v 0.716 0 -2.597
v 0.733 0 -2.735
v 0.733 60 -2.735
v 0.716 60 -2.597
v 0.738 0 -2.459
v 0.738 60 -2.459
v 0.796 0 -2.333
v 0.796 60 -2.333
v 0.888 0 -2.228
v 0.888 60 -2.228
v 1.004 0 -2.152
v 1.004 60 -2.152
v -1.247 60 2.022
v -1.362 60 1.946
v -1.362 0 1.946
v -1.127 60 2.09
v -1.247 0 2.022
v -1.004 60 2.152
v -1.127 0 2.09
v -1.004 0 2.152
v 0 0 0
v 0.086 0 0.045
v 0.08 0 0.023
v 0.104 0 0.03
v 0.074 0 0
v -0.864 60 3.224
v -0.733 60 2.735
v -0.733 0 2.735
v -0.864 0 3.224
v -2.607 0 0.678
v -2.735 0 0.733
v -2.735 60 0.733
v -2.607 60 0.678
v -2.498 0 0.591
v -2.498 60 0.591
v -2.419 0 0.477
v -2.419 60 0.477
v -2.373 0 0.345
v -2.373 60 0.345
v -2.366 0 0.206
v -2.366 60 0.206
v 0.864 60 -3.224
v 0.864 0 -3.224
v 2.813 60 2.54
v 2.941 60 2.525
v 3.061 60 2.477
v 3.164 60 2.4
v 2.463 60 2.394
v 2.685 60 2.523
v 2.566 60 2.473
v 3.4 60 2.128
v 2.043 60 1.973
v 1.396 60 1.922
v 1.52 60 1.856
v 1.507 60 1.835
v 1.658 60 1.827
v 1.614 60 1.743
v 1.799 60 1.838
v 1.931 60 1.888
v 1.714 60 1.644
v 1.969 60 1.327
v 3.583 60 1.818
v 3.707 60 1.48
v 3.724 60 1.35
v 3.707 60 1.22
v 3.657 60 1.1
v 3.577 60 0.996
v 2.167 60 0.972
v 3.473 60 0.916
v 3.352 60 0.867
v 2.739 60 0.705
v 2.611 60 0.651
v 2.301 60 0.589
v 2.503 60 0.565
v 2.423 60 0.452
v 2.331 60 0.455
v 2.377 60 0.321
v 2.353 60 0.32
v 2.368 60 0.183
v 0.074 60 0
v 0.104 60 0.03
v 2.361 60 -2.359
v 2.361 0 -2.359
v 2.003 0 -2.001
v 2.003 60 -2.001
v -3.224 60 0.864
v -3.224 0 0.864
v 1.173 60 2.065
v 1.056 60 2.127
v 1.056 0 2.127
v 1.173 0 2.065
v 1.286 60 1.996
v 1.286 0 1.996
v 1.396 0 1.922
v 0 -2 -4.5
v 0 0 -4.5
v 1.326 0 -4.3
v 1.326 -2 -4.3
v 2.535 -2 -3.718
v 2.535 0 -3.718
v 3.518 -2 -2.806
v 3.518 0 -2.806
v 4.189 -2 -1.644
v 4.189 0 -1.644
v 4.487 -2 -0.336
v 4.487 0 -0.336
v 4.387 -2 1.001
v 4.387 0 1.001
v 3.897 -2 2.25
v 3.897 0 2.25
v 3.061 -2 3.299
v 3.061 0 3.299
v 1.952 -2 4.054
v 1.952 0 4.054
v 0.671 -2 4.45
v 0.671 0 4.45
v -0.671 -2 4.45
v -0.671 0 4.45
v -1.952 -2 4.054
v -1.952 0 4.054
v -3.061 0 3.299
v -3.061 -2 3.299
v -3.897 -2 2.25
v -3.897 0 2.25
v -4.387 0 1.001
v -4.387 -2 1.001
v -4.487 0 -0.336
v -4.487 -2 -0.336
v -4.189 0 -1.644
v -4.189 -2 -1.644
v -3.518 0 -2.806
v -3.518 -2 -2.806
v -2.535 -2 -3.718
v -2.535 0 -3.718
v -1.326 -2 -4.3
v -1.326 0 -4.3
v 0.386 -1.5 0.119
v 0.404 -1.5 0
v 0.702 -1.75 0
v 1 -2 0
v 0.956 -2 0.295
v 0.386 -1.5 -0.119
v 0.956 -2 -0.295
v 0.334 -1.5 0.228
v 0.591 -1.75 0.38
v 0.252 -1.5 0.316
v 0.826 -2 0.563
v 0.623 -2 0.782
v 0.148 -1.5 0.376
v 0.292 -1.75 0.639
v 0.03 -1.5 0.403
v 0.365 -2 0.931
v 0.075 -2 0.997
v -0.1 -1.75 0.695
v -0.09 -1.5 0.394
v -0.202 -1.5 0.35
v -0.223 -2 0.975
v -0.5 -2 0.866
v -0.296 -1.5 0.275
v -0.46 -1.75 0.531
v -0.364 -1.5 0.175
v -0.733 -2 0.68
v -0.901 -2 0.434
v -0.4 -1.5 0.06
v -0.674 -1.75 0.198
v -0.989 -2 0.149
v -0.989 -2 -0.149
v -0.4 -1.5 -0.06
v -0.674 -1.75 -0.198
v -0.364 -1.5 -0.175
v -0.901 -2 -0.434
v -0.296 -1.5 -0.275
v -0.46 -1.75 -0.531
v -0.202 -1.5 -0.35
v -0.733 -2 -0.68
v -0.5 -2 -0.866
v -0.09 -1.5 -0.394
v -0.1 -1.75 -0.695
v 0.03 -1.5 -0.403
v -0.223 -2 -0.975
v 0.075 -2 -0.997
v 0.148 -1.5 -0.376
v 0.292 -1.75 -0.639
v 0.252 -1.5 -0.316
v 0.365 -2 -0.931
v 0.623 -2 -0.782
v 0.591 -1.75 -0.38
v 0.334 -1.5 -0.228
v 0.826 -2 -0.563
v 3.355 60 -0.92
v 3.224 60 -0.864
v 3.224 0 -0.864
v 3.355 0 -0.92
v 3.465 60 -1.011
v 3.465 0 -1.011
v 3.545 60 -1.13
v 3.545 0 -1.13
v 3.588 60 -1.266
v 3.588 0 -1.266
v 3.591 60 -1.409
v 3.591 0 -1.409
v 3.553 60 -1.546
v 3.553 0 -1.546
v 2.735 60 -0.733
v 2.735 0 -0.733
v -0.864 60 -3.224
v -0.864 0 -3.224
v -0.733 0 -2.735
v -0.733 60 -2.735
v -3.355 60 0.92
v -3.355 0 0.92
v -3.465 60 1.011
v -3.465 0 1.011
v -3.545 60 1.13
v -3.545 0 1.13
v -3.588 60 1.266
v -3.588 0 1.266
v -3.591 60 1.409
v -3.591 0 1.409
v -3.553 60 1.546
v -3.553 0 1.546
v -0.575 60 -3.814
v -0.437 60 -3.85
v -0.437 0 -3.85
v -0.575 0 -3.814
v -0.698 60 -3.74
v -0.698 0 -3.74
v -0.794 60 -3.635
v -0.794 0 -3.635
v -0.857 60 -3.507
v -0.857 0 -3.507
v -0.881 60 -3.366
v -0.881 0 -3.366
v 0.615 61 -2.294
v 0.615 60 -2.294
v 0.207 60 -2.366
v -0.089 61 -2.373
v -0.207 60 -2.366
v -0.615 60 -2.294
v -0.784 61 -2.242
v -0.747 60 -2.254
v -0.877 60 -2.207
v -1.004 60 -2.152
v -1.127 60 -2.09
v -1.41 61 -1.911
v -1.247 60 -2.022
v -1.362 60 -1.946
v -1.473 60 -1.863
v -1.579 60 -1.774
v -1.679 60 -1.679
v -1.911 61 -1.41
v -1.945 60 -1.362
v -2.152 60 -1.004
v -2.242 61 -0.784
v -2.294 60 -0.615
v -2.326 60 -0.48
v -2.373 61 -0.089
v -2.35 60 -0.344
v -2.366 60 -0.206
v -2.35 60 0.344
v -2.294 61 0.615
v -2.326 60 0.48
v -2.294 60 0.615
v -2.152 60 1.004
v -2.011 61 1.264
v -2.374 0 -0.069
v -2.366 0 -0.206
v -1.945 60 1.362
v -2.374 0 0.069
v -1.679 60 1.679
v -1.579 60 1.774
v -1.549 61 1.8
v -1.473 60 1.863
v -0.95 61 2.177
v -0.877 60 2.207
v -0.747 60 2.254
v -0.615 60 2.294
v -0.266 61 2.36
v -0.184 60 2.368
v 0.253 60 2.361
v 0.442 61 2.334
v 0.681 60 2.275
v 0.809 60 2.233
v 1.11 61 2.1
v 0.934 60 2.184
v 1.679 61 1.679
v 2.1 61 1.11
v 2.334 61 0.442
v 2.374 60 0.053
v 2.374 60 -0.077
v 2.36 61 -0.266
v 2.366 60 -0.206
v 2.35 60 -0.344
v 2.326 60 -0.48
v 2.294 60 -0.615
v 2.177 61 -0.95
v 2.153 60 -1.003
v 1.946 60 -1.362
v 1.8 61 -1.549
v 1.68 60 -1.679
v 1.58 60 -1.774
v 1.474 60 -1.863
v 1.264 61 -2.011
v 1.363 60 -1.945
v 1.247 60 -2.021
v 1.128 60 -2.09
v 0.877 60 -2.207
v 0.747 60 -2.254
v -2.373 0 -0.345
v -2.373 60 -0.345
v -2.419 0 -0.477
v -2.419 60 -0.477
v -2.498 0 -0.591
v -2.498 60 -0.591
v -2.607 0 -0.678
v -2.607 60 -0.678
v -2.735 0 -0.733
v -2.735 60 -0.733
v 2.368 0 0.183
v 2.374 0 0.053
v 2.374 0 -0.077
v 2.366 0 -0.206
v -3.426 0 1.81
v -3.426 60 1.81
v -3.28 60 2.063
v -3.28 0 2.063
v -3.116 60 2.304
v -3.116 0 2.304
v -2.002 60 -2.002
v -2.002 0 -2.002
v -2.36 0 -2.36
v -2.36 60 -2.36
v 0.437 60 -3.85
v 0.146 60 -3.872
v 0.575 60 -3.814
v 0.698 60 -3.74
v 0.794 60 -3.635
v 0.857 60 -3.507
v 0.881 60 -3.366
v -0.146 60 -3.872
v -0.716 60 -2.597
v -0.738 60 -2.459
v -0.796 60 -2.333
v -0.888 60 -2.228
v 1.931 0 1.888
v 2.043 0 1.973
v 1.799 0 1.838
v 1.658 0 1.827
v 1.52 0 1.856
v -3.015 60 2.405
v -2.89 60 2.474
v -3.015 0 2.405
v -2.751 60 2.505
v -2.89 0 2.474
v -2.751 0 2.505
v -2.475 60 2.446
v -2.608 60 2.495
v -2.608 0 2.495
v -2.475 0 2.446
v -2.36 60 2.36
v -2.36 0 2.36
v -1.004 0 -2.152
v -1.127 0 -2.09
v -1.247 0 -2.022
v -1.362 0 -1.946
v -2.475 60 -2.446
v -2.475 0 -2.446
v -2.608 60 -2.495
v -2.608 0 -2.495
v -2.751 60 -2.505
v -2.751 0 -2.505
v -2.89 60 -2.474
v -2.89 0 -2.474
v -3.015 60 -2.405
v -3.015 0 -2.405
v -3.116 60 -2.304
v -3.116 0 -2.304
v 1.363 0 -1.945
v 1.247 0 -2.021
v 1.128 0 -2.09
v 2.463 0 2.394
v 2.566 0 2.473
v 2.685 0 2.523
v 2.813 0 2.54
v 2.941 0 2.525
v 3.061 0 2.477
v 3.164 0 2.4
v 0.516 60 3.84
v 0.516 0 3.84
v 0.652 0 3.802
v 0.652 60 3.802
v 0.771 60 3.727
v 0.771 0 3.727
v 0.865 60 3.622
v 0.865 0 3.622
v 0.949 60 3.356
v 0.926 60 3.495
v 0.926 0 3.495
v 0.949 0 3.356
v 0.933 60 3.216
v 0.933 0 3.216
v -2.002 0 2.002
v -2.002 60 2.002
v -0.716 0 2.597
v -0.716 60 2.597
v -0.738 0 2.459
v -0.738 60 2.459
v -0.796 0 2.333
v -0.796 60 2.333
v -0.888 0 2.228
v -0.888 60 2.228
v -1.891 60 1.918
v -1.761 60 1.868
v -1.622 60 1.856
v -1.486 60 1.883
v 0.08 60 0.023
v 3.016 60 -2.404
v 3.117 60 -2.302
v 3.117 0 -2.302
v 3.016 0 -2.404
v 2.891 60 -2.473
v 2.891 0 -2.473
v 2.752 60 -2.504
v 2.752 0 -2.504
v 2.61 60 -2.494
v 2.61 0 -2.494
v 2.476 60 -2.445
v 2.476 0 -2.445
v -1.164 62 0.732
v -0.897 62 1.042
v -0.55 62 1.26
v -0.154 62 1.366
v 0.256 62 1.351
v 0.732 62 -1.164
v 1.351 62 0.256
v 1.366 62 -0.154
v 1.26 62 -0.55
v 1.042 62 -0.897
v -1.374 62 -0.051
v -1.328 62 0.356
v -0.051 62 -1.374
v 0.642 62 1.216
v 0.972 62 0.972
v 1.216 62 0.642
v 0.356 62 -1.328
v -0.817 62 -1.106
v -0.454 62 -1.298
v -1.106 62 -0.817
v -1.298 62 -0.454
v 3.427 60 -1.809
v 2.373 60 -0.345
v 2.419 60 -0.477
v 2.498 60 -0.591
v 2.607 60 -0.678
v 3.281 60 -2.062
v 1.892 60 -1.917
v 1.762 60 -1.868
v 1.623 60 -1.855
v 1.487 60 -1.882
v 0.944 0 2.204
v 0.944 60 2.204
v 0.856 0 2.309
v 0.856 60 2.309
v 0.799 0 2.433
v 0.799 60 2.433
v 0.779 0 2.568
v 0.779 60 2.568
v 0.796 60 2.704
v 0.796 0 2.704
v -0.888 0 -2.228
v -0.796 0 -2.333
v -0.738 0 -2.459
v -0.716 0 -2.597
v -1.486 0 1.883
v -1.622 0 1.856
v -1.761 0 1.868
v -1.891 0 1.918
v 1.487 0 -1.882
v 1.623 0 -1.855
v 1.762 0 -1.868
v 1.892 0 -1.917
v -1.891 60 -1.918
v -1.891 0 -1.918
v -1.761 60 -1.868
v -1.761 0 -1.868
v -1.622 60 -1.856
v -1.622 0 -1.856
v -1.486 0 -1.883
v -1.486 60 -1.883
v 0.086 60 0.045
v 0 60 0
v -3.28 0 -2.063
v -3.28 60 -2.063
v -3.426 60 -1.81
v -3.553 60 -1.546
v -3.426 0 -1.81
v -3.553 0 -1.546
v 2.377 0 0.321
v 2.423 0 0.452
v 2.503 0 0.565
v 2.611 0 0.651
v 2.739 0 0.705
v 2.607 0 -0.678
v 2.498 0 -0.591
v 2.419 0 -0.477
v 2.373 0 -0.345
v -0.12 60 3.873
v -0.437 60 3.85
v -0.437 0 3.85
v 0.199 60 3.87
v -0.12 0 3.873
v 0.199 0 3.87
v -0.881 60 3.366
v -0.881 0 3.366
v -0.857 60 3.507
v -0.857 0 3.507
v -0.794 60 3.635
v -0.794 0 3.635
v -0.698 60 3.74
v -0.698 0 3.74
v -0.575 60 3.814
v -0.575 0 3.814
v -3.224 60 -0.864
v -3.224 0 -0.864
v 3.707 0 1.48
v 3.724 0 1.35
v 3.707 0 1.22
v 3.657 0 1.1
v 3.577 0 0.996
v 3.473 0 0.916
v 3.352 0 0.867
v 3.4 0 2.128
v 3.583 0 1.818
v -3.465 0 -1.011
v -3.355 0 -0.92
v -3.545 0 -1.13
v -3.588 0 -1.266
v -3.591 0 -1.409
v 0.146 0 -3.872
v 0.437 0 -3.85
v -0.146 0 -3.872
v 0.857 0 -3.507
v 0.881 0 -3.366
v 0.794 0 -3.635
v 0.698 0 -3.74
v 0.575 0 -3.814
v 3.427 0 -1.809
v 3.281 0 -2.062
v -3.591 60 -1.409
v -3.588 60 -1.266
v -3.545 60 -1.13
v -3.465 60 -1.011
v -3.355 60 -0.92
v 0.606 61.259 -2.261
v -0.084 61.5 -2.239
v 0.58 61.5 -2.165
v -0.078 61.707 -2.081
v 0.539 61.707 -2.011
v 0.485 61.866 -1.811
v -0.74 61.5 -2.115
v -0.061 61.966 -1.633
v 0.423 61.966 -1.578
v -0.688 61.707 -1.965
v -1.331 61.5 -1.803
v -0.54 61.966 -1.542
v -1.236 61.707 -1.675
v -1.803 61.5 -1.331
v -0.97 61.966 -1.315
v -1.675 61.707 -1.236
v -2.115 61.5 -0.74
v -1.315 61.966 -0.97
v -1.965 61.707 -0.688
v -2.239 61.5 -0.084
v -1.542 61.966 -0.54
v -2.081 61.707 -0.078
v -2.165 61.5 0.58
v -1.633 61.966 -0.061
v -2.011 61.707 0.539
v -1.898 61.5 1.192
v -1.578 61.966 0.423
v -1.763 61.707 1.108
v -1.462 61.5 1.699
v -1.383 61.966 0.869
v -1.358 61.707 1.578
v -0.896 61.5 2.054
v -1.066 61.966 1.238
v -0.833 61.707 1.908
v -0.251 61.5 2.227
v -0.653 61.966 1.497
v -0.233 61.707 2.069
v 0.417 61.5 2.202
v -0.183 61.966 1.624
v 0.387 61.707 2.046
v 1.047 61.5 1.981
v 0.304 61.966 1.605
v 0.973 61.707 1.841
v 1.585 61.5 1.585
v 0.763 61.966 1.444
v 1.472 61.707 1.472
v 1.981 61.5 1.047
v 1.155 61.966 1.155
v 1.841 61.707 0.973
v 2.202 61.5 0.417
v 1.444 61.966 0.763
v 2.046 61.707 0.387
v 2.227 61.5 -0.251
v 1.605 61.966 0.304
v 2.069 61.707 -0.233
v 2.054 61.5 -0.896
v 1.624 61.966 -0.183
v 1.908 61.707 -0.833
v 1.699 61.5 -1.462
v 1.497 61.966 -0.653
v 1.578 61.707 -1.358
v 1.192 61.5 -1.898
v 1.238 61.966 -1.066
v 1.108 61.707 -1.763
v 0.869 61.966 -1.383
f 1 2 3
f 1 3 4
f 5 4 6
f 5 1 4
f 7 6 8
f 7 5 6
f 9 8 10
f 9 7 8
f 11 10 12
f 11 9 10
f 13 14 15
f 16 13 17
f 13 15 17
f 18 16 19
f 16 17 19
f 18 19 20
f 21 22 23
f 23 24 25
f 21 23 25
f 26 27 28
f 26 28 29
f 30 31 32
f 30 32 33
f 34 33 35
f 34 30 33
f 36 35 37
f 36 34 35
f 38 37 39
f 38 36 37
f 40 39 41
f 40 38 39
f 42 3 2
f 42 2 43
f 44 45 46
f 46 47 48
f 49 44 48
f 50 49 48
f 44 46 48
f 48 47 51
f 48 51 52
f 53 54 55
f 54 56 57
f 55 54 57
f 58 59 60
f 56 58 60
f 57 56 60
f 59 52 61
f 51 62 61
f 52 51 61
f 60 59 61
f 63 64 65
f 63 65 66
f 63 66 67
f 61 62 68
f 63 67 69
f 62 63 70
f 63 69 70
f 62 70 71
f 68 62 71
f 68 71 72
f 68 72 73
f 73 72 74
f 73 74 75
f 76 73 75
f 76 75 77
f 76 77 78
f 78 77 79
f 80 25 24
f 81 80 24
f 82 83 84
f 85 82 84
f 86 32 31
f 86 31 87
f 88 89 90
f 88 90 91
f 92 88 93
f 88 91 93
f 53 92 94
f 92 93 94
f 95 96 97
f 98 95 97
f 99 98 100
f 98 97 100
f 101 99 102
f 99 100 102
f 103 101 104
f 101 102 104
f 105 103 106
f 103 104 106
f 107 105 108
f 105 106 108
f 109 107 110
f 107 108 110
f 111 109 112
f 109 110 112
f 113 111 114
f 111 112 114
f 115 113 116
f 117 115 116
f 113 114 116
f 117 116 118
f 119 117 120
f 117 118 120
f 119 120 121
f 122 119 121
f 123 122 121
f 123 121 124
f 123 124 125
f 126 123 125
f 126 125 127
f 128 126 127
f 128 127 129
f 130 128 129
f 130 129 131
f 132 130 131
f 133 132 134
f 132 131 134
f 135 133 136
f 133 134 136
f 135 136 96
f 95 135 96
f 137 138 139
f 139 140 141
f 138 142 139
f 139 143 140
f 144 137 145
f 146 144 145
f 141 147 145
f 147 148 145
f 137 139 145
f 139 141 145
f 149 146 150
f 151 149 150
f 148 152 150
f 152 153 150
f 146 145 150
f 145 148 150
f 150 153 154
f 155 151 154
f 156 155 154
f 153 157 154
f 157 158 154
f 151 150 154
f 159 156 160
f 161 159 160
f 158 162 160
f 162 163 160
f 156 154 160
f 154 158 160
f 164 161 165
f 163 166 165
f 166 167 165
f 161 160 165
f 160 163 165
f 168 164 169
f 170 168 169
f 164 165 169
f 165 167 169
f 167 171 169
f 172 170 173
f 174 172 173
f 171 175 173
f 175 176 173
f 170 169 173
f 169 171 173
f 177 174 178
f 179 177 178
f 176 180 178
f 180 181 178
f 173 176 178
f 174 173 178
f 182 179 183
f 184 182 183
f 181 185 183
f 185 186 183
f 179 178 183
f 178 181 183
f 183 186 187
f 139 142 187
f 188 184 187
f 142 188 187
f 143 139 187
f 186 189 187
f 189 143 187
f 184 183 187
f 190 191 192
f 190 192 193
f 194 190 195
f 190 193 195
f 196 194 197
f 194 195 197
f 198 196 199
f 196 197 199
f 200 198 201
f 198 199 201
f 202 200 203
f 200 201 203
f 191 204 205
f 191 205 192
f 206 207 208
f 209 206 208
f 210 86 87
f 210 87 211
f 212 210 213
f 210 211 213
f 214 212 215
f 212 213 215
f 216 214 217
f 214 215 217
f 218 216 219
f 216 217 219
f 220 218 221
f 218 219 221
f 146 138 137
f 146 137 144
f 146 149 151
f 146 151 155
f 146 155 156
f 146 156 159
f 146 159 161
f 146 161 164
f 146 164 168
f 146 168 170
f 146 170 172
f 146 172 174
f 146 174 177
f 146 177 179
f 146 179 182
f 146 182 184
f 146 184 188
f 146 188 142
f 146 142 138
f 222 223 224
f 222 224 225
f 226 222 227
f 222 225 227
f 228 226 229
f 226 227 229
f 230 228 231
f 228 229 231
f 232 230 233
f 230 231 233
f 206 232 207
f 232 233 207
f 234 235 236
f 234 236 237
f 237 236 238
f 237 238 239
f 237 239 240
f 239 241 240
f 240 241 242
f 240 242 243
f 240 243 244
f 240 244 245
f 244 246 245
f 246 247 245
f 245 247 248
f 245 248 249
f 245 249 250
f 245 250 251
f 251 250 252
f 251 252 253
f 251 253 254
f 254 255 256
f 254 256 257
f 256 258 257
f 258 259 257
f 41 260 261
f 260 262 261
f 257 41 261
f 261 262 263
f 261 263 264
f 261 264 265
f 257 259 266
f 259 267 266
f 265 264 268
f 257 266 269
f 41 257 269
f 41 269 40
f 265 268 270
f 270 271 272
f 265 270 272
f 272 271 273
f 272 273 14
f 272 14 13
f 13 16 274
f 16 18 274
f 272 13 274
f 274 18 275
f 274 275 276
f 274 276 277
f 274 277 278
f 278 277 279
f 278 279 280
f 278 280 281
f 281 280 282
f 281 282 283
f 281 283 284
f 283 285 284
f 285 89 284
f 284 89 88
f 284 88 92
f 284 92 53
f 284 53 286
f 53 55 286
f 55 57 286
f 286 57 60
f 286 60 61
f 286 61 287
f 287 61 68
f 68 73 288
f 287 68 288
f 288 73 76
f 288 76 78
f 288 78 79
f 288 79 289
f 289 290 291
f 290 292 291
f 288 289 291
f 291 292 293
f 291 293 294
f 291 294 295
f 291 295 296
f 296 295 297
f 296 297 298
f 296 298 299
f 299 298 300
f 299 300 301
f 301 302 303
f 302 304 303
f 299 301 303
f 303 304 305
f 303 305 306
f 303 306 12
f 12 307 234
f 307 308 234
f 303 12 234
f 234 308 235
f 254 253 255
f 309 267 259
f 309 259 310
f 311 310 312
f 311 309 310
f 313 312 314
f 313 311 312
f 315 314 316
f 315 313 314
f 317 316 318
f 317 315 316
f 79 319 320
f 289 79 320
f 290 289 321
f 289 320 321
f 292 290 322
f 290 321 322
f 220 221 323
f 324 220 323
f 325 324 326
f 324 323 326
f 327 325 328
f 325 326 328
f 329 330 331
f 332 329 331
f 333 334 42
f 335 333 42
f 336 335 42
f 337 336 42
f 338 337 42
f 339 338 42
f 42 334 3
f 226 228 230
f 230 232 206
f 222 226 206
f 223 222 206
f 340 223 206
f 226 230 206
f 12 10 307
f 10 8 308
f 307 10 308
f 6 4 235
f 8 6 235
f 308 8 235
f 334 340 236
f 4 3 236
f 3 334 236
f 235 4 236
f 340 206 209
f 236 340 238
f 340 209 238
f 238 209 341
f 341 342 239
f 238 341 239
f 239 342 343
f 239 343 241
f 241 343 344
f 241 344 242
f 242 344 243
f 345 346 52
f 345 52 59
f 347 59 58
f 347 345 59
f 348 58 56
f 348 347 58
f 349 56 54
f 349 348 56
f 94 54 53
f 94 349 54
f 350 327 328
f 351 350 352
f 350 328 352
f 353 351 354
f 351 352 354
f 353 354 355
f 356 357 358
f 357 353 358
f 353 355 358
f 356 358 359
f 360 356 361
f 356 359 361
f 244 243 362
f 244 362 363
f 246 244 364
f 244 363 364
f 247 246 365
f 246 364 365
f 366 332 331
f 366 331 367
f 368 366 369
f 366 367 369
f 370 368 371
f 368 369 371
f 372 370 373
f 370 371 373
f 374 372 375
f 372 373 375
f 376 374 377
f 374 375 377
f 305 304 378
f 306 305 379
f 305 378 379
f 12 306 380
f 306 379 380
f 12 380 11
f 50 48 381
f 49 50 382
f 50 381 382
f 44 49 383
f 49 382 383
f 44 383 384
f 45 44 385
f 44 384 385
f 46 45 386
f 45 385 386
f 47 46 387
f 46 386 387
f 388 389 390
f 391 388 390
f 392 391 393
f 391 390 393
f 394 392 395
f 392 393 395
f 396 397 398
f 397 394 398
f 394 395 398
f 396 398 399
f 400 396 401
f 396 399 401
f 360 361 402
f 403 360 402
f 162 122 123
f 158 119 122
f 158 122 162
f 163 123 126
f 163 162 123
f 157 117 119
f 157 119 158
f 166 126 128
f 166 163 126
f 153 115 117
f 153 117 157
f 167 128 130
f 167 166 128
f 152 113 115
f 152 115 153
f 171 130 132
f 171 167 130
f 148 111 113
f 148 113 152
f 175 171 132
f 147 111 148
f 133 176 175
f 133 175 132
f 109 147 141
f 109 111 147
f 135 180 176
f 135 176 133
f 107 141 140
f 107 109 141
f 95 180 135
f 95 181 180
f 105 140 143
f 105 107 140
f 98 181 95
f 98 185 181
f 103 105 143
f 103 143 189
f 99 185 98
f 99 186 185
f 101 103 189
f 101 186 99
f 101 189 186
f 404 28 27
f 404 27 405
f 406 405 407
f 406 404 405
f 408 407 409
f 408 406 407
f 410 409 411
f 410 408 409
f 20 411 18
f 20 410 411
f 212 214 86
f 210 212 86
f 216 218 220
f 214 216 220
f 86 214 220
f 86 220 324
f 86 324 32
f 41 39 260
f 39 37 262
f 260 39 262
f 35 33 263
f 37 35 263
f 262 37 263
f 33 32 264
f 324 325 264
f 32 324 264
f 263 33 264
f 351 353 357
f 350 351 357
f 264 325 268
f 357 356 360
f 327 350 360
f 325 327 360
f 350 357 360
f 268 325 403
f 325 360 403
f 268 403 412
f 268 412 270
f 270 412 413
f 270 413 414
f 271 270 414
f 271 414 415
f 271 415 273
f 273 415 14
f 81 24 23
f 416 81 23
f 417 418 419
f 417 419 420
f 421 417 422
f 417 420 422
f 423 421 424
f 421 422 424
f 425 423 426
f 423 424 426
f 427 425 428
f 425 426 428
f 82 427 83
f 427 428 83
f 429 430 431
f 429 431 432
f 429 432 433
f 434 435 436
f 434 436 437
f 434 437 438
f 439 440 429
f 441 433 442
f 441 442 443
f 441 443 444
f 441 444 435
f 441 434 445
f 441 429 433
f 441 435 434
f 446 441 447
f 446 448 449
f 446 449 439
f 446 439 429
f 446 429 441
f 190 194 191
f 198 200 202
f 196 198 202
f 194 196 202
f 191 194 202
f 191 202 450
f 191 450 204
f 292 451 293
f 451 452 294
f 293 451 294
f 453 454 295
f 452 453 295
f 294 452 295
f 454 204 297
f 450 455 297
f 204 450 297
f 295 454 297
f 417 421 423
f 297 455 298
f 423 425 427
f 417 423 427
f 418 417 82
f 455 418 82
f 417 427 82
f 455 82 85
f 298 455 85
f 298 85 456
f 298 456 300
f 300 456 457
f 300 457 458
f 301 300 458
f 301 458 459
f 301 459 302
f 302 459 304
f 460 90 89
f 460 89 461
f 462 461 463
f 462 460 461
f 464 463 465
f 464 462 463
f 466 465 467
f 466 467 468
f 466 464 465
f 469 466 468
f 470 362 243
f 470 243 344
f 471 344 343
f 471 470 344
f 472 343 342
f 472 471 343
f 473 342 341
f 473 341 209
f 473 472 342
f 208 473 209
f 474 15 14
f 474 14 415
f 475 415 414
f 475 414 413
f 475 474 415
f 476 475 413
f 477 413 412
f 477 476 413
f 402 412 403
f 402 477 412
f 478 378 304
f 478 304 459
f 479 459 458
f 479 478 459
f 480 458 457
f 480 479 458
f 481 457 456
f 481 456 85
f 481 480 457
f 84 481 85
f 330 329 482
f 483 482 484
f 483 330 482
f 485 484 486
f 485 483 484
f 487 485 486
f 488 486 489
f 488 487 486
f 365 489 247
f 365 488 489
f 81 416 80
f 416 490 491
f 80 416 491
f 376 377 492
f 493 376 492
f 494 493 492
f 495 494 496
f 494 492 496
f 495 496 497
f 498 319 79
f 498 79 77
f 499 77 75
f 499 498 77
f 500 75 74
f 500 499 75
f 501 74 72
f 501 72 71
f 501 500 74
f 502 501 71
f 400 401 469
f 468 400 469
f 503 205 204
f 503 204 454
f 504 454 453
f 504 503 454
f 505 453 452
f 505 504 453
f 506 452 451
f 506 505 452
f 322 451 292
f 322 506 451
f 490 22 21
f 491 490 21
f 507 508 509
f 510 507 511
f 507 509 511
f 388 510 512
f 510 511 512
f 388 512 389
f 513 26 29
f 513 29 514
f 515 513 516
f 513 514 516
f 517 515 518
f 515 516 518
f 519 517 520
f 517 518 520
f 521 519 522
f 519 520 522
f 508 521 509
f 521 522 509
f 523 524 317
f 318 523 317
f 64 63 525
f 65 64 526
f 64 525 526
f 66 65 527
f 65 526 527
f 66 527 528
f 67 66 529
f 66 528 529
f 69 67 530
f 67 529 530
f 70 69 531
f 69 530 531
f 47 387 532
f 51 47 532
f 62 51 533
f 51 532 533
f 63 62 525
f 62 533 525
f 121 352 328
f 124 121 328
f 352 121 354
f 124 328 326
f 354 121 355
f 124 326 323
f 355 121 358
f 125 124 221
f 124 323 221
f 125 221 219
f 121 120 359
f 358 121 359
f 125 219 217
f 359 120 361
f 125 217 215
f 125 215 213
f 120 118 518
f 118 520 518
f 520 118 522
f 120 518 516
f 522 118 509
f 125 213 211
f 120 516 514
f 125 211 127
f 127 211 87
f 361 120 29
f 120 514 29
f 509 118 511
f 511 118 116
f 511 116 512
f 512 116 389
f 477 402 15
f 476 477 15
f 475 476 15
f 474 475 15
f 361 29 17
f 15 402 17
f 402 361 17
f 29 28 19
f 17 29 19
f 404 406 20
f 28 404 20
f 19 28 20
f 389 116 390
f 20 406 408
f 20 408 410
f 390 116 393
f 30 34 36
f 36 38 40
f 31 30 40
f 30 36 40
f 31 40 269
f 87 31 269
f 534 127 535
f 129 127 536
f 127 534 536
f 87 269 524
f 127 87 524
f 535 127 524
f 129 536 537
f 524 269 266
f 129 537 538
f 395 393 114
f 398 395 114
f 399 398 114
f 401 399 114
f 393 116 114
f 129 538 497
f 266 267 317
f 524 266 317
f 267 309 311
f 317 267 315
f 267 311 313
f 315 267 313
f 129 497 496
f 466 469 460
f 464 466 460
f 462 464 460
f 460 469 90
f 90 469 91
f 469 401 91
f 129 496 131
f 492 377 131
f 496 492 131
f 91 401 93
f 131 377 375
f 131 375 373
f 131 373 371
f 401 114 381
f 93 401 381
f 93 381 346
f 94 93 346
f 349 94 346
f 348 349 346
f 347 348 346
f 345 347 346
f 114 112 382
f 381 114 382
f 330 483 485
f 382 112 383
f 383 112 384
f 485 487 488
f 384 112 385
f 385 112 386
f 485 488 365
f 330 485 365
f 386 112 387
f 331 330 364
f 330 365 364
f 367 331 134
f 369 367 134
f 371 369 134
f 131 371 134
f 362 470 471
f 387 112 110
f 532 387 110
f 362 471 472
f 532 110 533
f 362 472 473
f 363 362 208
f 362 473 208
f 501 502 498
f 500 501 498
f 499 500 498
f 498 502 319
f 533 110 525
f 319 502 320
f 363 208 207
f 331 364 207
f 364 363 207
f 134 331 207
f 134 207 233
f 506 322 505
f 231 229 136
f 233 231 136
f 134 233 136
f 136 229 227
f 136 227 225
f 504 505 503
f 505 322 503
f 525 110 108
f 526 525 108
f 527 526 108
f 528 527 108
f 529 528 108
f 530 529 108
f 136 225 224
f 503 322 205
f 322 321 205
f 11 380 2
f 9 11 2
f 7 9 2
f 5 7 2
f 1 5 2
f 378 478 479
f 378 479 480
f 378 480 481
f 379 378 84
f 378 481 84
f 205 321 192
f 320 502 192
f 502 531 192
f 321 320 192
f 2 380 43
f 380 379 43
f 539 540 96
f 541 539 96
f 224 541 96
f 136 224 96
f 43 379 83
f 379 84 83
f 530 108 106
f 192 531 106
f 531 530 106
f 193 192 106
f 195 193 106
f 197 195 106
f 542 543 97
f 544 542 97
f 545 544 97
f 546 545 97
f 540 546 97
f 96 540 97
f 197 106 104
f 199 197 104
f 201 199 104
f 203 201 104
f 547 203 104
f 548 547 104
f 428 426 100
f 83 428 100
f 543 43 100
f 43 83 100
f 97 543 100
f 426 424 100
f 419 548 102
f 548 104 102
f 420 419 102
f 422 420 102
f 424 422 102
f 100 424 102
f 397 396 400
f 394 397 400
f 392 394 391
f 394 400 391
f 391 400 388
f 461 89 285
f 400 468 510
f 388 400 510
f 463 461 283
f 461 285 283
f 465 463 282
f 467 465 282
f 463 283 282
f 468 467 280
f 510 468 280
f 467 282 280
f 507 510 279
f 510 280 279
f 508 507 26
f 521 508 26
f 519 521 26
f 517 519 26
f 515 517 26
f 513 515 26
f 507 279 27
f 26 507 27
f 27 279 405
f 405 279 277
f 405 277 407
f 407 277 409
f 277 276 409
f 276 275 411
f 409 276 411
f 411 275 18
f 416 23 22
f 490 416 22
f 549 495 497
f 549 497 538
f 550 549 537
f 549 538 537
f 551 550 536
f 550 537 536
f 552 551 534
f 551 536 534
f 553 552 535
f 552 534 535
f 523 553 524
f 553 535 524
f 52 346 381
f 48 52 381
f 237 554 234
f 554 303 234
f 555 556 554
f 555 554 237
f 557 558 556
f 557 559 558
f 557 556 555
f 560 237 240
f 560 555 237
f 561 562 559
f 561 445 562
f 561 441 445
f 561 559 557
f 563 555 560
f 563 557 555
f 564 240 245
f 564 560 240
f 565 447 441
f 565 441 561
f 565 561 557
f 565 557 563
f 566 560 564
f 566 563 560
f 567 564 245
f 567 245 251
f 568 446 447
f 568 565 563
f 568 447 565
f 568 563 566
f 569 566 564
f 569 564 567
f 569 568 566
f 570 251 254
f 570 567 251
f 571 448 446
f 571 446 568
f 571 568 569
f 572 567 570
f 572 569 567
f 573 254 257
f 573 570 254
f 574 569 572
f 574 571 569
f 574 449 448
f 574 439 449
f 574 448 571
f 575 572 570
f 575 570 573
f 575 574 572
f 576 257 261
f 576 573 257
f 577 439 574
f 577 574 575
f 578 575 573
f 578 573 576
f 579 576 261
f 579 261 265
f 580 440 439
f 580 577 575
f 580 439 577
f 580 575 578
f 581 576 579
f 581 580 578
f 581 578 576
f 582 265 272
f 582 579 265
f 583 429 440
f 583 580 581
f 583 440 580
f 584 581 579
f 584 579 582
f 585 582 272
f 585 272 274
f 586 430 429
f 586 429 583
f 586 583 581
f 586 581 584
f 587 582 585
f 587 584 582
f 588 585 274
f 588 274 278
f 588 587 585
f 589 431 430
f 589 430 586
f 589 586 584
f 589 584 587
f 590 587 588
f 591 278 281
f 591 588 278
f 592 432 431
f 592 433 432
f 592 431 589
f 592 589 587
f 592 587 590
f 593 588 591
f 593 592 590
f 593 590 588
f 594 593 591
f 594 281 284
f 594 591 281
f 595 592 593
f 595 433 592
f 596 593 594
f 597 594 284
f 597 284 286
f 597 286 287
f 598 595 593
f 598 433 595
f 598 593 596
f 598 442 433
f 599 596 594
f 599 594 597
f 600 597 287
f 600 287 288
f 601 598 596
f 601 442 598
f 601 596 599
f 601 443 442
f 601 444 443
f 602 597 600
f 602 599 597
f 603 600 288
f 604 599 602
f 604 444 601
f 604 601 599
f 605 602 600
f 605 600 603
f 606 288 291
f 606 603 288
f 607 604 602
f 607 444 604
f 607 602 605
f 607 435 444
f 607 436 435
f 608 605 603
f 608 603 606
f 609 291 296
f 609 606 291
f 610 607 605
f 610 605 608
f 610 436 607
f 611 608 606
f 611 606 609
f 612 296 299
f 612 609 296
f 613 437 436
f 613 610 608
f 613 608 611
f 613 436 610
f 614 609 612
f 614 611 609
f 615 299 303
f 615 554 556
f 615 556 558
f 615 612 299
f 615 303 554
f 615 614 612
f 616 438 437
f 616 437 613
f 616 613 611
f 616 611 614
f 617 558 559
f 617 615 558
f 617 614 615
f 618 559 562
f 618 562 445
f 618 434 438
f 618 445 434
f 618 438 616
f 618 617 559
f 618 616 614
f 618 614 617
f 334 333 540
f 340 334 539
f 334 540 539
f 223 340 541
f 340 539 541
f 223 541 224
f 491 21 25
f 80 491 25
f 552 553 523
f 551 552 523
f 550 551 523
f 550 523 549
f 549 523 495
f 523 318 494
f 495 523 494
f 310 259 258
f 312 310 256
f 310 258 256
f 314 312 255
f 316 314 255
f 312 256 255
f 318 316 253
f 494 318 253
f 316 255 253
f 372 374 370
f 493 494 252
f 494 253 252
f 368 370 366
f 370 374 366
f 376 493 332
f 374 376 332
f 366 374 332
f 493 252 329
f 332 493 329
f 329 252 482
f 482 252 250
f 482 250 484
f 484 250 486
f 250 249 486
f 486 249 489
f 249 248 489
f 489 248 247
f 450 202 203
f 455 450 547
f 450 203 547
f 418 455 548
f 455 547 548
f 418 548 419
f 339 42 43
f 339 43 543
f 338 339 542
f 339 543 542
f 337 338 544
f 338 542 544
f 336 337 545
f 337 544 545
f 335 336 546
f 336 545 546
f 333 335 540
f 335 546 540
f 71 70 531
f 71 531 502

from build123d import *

# Parameters (mm, degrees)
BOSS_EXTRUDE1_DEPTH = 60
SKETCH3_R           = 4.5
BOSS_EXTRUDE2_DEPTH = 2
SKETCH4_R           = 2.375
BOSS_EXTRUDE3_DEPTH = 2
FILLET1_R           = 0.5
SKETCH6_R           = 1
CUT_EXTRUDE4_DEPTH  = 0.5
CUT_EXTRUDE4_DRAFT  = -50
FILLET2_R           = 1


with BuildPart() as part:
    # Sketch2 → Boss-Extrude1 (new body)
    with BuildSketch(Plane(origin=(0, 0, 0), x_dir=(1, 0, 0), z_dir=(0, 1, 0))):
        with BuildLine():
            Line((3.775215965, -0.978645895), (2.300774305, -0.58912019))
            ThreePointArc((2.300774305, -0.58912019), (2.374963211, 0.013219106), (2.294073837, 0.614695232))
            Line((2.294073837, 0.614695232), (3.742962577, 1.0029238))
            ThreePointArc((3.742962577, 1.0029238), (3.356294138, 1.936727823), (2.741299364, 2.73877761))
            Line((2.741299364, 2.73877761), (1.680151223, 1.678605632))
            ThreePointArc((1.680151223, 1.678605632), (1.187973207, 2.056537055), (0.614695232, 2.294073837))
            Line((0.614695232, 2.294073837), (1.0029238, 3.742962577))
            ThreePointArc((1.0029238, 3.742962577), (0, 3.875), (-1.0029238, 3.742962577))
            Line((-1.0029238, 3.742962577), (-0.614695232, 2.294073837))
            ThreePointArc((-0.614695232, 2.294073837), (-1.1875, 2.056810334), (-1.679378605, 1.679378605))
            Line((-1.679378605, 1.679378605), (-2.740038777, 2.740038777))
            ThreePointArc((-2.740038777, 2.740038777), (-3.35584844, 1.9375), (-3.742962577, 1.0029238))
            Line((-3.742962577, 1.0029238), (-2.294073837, 0.614695232))
            ThreePointArc((-2.294073837, 0.614695232), (-2.375, 0), (-2.294073837, -0.614695232))
            Line((-2.294073837, -0.614695232), (-3.742962577, -1.0029238))
            ThreePointArc((-3.742962577, -1.0029238), (-3.35584844, -1.9375), (-2.740038777, -2.740038777))
            Line((-2.740038777, -2.740038777), (-1.679378605, -1.679378605))
            ThreePointArc((-1.679378605, -1.679378605), (-1.1875, -2.056810334), (-0.614695232, -2.294073837))
            Line((-0.614695232, -2.294073837), (-1.0029238, -3.742962577))
            ThreePointArc((-1.0029238, -3.742962577), (0.033967076, -3.874851125), (1.068386506, -3.724805401))
            Line((1.068386506, -3.724805401), (0.681359786, -2.275164575))
            ThreePointArc((0.681359786, -2.275164575), (1.238849907, -2.026296106), (1.714477211, -1.643530618))
            Line((1.714477211, -1.643530618), (2.767163136, -2.698133353))
            ThreePointArc((2.767163136, -2.698133353), (3.500652231, -1.972912562), (3.775215965, -0.978645895))
        make_face()
        Polygon((0.085836926, -0.044584082), (0, 0), (0.073933818, 0), (0.104207494, -0.030328801), (0.080162685, -0.023330742), align=None, mode=Mode.SUBTRACT)
    extrude(amount=BOSS_EXTRUDE1_DEPTH)

    # Sketch3 → Boss-Extrude2 (add)
    with BuildSketch(Plane.XZ):
        with Locations(Location((0, 0, 0), (0, 0, 270))):
            Circle(SKETCH3_R)
    extrude(amount=BOSS_EXTRUDE2_DEPTH)

    # Sketch4 → Boss-Extrude3 (add)
    with BuildSketch(Plane(origin=(0, 60, 0), x_dir=(1, 0, 0), z_dir=(0, 1, 0))):
        with Locations(Location((0, 0, 0), (0, 0, 75))):
            Circle(SKETCH4_R)
    extrude(amount=BOSS_EXTRUDE3_DEPTH)

    # Fillet1
    # the kernel refuses this fillet: 0.5 mm, written as the material it adds along each edge
    with BuildSketch(Plane(origin=(-2.294073837, -1.140469783, 0.614695232), x_dir=(-0.965925826289068, 0, 0.2588190451025218), z_dir=(0, 1, 0)), Plane(origin=(-1.679378605, -1.140469783, -1.679378605), x_dir=(-0.7071067811865478, 0, -0.7071067811865474), z_dir=(0, 1, 0)), Plane(origin=(0.614695232, -1.140469783, -2.294073837), x_dir=(0.2588190451025215, 0, -0.9659258262890681), z_dir=(0, 1, 0)), Plane(origin=(2.294073837, -1.140469783, -0.614695232), x_dir=(0.9659258262890681, 0, -0.2588190451025215), z_dir=(0, 1, 0)), Plane(origin=(-0.614695232, -1.140469783, 2.294073837), x_dir=(-0.2588190451025215, 0, 0.9659258262890681), z_dir=(0, 1, 0))) as fillet1_piece_1:
        with BuildLine():
            CenterArc((0.456187913, -0.5), FILLET1_R, 90, 79.984589832)
            ThreePointArc((-0.036192593, -0.413043478), (-0.00906545, -0.20731306), (0, 0))
            Line((0, 0), (0.456187913, 0))
        make_face()
    extrude(amount=61.140469783)
    with BuildSketch(Plane(origin=(-2.294073837, -1.140469783, -0.614695232), x_dir=(-0.17351574004952178, 0, 0.9848310961556133), z_dir=(0, 1, 0)), Plane(origin=(-1.679378605, -1.140469783, 1.679378605), x_dir=(0.7661308776828862, 0, 0.6426845869171364), z_dir=(0, 1, 0))) as fillet1_piece_2:
        with BuildLine():
            CenterArc((0.458270974, -0.498091484), FILLET1_R, 95.007705084, 79.984589832)
            Line((-0.03982051, -0.45444663), (0, 0))
            ThreePointArc((0, 0), (0.20731306, -0.00906545), (0.414626119, 0))
        make_face()
    extrude(amount=61.140469783)
    with BuildSketch(Plane(origin=(-0.614695232, -1.140469783, -2.294073837), x_dir=(-0.258819045102522, 0, -0.965925826289068), z_dir=(0, 1, 0)), Plane(origin=(1.680151223, -1.140469783, -1.678605632), x_dir=(0.707432093873984, 0, -0.7067813187663288), z_dir=(0, 1, 0))) as fillet1_piece_3:
        with BuildLine():
            CenterArc((0.456187913, 0.5), FILLET1_R, 190.015410168, 79.984589832)
            ThreePointArc((-0.036192593, 0.413043478), (-0.00906545, 0.20731306), (0, 0))
            Line((0, 0), (0.456187913, 0))
        make_face()
    extrude(amount=61.140469783)
    with BuildSketch(Plane(origin=(2.300774305, -1.132506036, 0.58912019), x_dir=(0.16314582309469597, 0, -0.9866019665532569), z_dir=(0, 1, 0))) as fillet1_piece_4:
        with BuildLine():
            CenterArc((0.455070929, -0.498118095), FILLET1_R, 94.972648578, 79.61829146)
            Line((-0.042702606, -0.450985227), (0, 0))
            ThreePointArc((0, 0), (0.20586542, -0.008939048), (0.411730841, 0))
        make_face()
    extrude(amount=61.132506036)
    with BuildSketch(Plane(origin=(1.714477211, -1.163771178, 1.643530618), x_dir=(0.7064632978713467, 0, 0.7077496794494088), z_dir=(0, 1, 0))) as fillet1_piece_5:
        with BuildLine():
            CenterArc((0.465508471, -0.5), FILLET1_R, 90, 81.041880237)
            ThreePointArc((-0.02839274, -0.422143763), (-0.00477723, -0.211705398), (0, 0))
            Line((0, 0), (0.465508471, 0))
        make_face()
    extrude(amount=61.163771178)
    with BuildSketch(Plane(origin=(0.681359786, -1.109284133, 2.275164575), x_dir=(0.9301474254657973, 0, -0.3671862836481626), z_dir=(0, 1, 0))) as fillet1_piece_6:
        with BuildLine():
            CenterArc((0.445739753, -0.498194619), FILLET1_R, 94.870436099, 78.535607624)
            Line((-0.050952689, -0.440778436), (0, 0))
            ThreePointArc((0, 0), (0.201644174, -0.008575561), (0.403288348, 0))
        make_face()
    extrude(amount=61.109284133)
    # the kernel refuses this fillet: 0.5 mm, written as the material it takes off along each edge
    with BuildSketch(Plane(origin=(-2.740038777, 0, 2.740038777), x_dir=(-0.6526300069150477, 0, -0.7576767609436524), z_dir=(0, 1, 0)), Plane(origin=(-3.742962577, 0, -1.0029238), x_dir=(0.32985231937679765, 0, -0.9440325457322681), z_dir=(0, 1, 0)), Plane(origin=(-1.0029238, 0, -3.742962577), x_dir=(0.982482326291838, 0, -0.18635578478860887), z_dir=(0, 1, 0)), Plane(origin=(2.741299364, 0, -2.73877761), x_dir=(0.6522812796019254, 0, 0.7579769998363239), z_dir=(0, 1, 0))) as fillet1_2_piece_1:
        with BuildLine():
            CenterArc((0.538524723, -0.49861874), FILLET1_R, 85.740187873, 98.519624254)
            Line((0.039905983, -0.535758376), (0, 0))
            ThreePointArc((0, 0), (0.287832179, 0.010704768), (0.575664359, 0))
        make_face()
    extrude(amount=61.439160897, mode=Mode.SUBTRACT)
    with BuildSketch(Plane(origin=(-3.742962577, 0, 1.0029238), x_dir=(0.9659258262890679, 0, -0.2588190451025218), z_dir=(0, 1, 0)), Plane(origin=(-2.740038777, 0, -2.740038777), x_dir=(0.7071067811865476, 0, 0.7071067811865476), z_dir=(0, 1, 0)), Plane(origin=(1.0029238, 0, -3.742962577), x_dir=(-0.25881904510252196, 0, 0.965925826289068), z_dir=(0, 1, 0)), Plane(origin=(3.742962577, 0, -1.0029238), x_dir=(-0.9659258262890681, 0, 0.25881904510252185), z_dir=(0, 1, 0)), Plane(origin=(-1.0029238, 0, 3.742962577), x_dir=(0.2588190451025216, 0, -0.9659258262890681), z_dir=(0, 1, 0))) as fillet1_2_piece_2:
        with BuildLine():
            CenterArc((0.537242519, -0.5), FILLET1_R, 90, 98.519624254)
            ThreePointArc((0.04275993, -0.574074074), (0.010704768, -0.287832179), (0, 0))
            Line((0, 0), (0.537242519, 0))
        make_face()
    extrude(amount=61.439160897, mode=Mode.SUBTRACT)
    with BuildSketch(Plane(origin=(3.775215965, 0, 0.978645895), x_dir=(-0.13498089829276533, 0, 0.9908482008340522), z_dir=(0, 1, 0))) as fillet1_2_piece_3:
        with BuildLine():
            CenterArc((0.442538799, -0.49598715), FILLET1_R, 82.736098253, 90.22281865)
            Line((-0.053690457, -0.434696649), (0, 0))
            ThreePointArc((0, 0), (0.252879314, 0.016051399), (0.505758627, 0))
        make_face()
    extrude(amount=61.264396568, mode=Mode.SUBTRACT)
    with BuildSketch(Plane(origin=(2.767163136, 0, 2.698133353), x_dir=(0.8000663385432955, 0, -0.5999115384203949), z_dir=(0, 1, 0))) as fillet1_2_piece_4:
        with BuildLine():
            CenterArc((0.434547354, 0.496131331), FILLET1_R, 188.084320914, 89.047719887)
            Line((-0.060483736, 0.425816179), (0, 0))
            ThreePointArc((0, 0), (0.248312773, -0.015474675), (0.496625547, 0))
        make_face()
    extrude(amount=61.241563867, mode=Mode.SUBTRACT)
    with BuildSketch(Plane(origin=(1.068386506, 0, 3.724805401), x_dir=(-0.9787647804449897, 0, 0.20498659605074468), z_dir=(0, 1, 0))) as fillet1_2_piece_5:
        with BuildLine():
            CenterArc((0.527919562, -0.498672678), FILLET1_R, 85.824226653, 97.295295094)
            Line((0.028660468, -0.525882193), (0, 0))
            ThreePointArc((0, 0), (0.282163904, 0.010286747), (0.564327807, 0))
        make_face()
    extrude(amount=61.410819518, mode=Mode.SUBTRACT)


with BuildPart() as cut_extrude4_tool:
    # Sketch6 → Cut-Extrude4 (with draft: the straight prism first)
    with BuildSketch(Plane.XZ.offset(2)):
        Circle(SKETCH6_R)
    extrude(amount=-CUT_EXTRUDE4_DEPTH)
    # Cut-Extrude4: the draft: its side faces are tilted about the plane it starts from
    cut_extrude4_sides = [cut_extrude4_tool.faces().sort_by_distance(p)[0] for p in [
        (-1, -1.75, 0),
    ]]
    draft(cut_extrude4_sides, Plane.XZ.offset(2), CUT_EXTRUDE4_DRAFT)


with BuildPart() as part_1:
    add(part.part)

    # Cut-Extrude4: cut by cut_extrude4_tool
    add(cut_extrude4_tool.part, mode=Mode.SUBTRACT)

    # Fillet2
    fillet2_edges = [part_1.edges().sort_by_distance(p)[0] for p in [
        (-0.614695232, 62, 2.294073837),
    ]]
    fillet(fillet2_edges, radius=FILLET2_R)


solid = part_1.part
